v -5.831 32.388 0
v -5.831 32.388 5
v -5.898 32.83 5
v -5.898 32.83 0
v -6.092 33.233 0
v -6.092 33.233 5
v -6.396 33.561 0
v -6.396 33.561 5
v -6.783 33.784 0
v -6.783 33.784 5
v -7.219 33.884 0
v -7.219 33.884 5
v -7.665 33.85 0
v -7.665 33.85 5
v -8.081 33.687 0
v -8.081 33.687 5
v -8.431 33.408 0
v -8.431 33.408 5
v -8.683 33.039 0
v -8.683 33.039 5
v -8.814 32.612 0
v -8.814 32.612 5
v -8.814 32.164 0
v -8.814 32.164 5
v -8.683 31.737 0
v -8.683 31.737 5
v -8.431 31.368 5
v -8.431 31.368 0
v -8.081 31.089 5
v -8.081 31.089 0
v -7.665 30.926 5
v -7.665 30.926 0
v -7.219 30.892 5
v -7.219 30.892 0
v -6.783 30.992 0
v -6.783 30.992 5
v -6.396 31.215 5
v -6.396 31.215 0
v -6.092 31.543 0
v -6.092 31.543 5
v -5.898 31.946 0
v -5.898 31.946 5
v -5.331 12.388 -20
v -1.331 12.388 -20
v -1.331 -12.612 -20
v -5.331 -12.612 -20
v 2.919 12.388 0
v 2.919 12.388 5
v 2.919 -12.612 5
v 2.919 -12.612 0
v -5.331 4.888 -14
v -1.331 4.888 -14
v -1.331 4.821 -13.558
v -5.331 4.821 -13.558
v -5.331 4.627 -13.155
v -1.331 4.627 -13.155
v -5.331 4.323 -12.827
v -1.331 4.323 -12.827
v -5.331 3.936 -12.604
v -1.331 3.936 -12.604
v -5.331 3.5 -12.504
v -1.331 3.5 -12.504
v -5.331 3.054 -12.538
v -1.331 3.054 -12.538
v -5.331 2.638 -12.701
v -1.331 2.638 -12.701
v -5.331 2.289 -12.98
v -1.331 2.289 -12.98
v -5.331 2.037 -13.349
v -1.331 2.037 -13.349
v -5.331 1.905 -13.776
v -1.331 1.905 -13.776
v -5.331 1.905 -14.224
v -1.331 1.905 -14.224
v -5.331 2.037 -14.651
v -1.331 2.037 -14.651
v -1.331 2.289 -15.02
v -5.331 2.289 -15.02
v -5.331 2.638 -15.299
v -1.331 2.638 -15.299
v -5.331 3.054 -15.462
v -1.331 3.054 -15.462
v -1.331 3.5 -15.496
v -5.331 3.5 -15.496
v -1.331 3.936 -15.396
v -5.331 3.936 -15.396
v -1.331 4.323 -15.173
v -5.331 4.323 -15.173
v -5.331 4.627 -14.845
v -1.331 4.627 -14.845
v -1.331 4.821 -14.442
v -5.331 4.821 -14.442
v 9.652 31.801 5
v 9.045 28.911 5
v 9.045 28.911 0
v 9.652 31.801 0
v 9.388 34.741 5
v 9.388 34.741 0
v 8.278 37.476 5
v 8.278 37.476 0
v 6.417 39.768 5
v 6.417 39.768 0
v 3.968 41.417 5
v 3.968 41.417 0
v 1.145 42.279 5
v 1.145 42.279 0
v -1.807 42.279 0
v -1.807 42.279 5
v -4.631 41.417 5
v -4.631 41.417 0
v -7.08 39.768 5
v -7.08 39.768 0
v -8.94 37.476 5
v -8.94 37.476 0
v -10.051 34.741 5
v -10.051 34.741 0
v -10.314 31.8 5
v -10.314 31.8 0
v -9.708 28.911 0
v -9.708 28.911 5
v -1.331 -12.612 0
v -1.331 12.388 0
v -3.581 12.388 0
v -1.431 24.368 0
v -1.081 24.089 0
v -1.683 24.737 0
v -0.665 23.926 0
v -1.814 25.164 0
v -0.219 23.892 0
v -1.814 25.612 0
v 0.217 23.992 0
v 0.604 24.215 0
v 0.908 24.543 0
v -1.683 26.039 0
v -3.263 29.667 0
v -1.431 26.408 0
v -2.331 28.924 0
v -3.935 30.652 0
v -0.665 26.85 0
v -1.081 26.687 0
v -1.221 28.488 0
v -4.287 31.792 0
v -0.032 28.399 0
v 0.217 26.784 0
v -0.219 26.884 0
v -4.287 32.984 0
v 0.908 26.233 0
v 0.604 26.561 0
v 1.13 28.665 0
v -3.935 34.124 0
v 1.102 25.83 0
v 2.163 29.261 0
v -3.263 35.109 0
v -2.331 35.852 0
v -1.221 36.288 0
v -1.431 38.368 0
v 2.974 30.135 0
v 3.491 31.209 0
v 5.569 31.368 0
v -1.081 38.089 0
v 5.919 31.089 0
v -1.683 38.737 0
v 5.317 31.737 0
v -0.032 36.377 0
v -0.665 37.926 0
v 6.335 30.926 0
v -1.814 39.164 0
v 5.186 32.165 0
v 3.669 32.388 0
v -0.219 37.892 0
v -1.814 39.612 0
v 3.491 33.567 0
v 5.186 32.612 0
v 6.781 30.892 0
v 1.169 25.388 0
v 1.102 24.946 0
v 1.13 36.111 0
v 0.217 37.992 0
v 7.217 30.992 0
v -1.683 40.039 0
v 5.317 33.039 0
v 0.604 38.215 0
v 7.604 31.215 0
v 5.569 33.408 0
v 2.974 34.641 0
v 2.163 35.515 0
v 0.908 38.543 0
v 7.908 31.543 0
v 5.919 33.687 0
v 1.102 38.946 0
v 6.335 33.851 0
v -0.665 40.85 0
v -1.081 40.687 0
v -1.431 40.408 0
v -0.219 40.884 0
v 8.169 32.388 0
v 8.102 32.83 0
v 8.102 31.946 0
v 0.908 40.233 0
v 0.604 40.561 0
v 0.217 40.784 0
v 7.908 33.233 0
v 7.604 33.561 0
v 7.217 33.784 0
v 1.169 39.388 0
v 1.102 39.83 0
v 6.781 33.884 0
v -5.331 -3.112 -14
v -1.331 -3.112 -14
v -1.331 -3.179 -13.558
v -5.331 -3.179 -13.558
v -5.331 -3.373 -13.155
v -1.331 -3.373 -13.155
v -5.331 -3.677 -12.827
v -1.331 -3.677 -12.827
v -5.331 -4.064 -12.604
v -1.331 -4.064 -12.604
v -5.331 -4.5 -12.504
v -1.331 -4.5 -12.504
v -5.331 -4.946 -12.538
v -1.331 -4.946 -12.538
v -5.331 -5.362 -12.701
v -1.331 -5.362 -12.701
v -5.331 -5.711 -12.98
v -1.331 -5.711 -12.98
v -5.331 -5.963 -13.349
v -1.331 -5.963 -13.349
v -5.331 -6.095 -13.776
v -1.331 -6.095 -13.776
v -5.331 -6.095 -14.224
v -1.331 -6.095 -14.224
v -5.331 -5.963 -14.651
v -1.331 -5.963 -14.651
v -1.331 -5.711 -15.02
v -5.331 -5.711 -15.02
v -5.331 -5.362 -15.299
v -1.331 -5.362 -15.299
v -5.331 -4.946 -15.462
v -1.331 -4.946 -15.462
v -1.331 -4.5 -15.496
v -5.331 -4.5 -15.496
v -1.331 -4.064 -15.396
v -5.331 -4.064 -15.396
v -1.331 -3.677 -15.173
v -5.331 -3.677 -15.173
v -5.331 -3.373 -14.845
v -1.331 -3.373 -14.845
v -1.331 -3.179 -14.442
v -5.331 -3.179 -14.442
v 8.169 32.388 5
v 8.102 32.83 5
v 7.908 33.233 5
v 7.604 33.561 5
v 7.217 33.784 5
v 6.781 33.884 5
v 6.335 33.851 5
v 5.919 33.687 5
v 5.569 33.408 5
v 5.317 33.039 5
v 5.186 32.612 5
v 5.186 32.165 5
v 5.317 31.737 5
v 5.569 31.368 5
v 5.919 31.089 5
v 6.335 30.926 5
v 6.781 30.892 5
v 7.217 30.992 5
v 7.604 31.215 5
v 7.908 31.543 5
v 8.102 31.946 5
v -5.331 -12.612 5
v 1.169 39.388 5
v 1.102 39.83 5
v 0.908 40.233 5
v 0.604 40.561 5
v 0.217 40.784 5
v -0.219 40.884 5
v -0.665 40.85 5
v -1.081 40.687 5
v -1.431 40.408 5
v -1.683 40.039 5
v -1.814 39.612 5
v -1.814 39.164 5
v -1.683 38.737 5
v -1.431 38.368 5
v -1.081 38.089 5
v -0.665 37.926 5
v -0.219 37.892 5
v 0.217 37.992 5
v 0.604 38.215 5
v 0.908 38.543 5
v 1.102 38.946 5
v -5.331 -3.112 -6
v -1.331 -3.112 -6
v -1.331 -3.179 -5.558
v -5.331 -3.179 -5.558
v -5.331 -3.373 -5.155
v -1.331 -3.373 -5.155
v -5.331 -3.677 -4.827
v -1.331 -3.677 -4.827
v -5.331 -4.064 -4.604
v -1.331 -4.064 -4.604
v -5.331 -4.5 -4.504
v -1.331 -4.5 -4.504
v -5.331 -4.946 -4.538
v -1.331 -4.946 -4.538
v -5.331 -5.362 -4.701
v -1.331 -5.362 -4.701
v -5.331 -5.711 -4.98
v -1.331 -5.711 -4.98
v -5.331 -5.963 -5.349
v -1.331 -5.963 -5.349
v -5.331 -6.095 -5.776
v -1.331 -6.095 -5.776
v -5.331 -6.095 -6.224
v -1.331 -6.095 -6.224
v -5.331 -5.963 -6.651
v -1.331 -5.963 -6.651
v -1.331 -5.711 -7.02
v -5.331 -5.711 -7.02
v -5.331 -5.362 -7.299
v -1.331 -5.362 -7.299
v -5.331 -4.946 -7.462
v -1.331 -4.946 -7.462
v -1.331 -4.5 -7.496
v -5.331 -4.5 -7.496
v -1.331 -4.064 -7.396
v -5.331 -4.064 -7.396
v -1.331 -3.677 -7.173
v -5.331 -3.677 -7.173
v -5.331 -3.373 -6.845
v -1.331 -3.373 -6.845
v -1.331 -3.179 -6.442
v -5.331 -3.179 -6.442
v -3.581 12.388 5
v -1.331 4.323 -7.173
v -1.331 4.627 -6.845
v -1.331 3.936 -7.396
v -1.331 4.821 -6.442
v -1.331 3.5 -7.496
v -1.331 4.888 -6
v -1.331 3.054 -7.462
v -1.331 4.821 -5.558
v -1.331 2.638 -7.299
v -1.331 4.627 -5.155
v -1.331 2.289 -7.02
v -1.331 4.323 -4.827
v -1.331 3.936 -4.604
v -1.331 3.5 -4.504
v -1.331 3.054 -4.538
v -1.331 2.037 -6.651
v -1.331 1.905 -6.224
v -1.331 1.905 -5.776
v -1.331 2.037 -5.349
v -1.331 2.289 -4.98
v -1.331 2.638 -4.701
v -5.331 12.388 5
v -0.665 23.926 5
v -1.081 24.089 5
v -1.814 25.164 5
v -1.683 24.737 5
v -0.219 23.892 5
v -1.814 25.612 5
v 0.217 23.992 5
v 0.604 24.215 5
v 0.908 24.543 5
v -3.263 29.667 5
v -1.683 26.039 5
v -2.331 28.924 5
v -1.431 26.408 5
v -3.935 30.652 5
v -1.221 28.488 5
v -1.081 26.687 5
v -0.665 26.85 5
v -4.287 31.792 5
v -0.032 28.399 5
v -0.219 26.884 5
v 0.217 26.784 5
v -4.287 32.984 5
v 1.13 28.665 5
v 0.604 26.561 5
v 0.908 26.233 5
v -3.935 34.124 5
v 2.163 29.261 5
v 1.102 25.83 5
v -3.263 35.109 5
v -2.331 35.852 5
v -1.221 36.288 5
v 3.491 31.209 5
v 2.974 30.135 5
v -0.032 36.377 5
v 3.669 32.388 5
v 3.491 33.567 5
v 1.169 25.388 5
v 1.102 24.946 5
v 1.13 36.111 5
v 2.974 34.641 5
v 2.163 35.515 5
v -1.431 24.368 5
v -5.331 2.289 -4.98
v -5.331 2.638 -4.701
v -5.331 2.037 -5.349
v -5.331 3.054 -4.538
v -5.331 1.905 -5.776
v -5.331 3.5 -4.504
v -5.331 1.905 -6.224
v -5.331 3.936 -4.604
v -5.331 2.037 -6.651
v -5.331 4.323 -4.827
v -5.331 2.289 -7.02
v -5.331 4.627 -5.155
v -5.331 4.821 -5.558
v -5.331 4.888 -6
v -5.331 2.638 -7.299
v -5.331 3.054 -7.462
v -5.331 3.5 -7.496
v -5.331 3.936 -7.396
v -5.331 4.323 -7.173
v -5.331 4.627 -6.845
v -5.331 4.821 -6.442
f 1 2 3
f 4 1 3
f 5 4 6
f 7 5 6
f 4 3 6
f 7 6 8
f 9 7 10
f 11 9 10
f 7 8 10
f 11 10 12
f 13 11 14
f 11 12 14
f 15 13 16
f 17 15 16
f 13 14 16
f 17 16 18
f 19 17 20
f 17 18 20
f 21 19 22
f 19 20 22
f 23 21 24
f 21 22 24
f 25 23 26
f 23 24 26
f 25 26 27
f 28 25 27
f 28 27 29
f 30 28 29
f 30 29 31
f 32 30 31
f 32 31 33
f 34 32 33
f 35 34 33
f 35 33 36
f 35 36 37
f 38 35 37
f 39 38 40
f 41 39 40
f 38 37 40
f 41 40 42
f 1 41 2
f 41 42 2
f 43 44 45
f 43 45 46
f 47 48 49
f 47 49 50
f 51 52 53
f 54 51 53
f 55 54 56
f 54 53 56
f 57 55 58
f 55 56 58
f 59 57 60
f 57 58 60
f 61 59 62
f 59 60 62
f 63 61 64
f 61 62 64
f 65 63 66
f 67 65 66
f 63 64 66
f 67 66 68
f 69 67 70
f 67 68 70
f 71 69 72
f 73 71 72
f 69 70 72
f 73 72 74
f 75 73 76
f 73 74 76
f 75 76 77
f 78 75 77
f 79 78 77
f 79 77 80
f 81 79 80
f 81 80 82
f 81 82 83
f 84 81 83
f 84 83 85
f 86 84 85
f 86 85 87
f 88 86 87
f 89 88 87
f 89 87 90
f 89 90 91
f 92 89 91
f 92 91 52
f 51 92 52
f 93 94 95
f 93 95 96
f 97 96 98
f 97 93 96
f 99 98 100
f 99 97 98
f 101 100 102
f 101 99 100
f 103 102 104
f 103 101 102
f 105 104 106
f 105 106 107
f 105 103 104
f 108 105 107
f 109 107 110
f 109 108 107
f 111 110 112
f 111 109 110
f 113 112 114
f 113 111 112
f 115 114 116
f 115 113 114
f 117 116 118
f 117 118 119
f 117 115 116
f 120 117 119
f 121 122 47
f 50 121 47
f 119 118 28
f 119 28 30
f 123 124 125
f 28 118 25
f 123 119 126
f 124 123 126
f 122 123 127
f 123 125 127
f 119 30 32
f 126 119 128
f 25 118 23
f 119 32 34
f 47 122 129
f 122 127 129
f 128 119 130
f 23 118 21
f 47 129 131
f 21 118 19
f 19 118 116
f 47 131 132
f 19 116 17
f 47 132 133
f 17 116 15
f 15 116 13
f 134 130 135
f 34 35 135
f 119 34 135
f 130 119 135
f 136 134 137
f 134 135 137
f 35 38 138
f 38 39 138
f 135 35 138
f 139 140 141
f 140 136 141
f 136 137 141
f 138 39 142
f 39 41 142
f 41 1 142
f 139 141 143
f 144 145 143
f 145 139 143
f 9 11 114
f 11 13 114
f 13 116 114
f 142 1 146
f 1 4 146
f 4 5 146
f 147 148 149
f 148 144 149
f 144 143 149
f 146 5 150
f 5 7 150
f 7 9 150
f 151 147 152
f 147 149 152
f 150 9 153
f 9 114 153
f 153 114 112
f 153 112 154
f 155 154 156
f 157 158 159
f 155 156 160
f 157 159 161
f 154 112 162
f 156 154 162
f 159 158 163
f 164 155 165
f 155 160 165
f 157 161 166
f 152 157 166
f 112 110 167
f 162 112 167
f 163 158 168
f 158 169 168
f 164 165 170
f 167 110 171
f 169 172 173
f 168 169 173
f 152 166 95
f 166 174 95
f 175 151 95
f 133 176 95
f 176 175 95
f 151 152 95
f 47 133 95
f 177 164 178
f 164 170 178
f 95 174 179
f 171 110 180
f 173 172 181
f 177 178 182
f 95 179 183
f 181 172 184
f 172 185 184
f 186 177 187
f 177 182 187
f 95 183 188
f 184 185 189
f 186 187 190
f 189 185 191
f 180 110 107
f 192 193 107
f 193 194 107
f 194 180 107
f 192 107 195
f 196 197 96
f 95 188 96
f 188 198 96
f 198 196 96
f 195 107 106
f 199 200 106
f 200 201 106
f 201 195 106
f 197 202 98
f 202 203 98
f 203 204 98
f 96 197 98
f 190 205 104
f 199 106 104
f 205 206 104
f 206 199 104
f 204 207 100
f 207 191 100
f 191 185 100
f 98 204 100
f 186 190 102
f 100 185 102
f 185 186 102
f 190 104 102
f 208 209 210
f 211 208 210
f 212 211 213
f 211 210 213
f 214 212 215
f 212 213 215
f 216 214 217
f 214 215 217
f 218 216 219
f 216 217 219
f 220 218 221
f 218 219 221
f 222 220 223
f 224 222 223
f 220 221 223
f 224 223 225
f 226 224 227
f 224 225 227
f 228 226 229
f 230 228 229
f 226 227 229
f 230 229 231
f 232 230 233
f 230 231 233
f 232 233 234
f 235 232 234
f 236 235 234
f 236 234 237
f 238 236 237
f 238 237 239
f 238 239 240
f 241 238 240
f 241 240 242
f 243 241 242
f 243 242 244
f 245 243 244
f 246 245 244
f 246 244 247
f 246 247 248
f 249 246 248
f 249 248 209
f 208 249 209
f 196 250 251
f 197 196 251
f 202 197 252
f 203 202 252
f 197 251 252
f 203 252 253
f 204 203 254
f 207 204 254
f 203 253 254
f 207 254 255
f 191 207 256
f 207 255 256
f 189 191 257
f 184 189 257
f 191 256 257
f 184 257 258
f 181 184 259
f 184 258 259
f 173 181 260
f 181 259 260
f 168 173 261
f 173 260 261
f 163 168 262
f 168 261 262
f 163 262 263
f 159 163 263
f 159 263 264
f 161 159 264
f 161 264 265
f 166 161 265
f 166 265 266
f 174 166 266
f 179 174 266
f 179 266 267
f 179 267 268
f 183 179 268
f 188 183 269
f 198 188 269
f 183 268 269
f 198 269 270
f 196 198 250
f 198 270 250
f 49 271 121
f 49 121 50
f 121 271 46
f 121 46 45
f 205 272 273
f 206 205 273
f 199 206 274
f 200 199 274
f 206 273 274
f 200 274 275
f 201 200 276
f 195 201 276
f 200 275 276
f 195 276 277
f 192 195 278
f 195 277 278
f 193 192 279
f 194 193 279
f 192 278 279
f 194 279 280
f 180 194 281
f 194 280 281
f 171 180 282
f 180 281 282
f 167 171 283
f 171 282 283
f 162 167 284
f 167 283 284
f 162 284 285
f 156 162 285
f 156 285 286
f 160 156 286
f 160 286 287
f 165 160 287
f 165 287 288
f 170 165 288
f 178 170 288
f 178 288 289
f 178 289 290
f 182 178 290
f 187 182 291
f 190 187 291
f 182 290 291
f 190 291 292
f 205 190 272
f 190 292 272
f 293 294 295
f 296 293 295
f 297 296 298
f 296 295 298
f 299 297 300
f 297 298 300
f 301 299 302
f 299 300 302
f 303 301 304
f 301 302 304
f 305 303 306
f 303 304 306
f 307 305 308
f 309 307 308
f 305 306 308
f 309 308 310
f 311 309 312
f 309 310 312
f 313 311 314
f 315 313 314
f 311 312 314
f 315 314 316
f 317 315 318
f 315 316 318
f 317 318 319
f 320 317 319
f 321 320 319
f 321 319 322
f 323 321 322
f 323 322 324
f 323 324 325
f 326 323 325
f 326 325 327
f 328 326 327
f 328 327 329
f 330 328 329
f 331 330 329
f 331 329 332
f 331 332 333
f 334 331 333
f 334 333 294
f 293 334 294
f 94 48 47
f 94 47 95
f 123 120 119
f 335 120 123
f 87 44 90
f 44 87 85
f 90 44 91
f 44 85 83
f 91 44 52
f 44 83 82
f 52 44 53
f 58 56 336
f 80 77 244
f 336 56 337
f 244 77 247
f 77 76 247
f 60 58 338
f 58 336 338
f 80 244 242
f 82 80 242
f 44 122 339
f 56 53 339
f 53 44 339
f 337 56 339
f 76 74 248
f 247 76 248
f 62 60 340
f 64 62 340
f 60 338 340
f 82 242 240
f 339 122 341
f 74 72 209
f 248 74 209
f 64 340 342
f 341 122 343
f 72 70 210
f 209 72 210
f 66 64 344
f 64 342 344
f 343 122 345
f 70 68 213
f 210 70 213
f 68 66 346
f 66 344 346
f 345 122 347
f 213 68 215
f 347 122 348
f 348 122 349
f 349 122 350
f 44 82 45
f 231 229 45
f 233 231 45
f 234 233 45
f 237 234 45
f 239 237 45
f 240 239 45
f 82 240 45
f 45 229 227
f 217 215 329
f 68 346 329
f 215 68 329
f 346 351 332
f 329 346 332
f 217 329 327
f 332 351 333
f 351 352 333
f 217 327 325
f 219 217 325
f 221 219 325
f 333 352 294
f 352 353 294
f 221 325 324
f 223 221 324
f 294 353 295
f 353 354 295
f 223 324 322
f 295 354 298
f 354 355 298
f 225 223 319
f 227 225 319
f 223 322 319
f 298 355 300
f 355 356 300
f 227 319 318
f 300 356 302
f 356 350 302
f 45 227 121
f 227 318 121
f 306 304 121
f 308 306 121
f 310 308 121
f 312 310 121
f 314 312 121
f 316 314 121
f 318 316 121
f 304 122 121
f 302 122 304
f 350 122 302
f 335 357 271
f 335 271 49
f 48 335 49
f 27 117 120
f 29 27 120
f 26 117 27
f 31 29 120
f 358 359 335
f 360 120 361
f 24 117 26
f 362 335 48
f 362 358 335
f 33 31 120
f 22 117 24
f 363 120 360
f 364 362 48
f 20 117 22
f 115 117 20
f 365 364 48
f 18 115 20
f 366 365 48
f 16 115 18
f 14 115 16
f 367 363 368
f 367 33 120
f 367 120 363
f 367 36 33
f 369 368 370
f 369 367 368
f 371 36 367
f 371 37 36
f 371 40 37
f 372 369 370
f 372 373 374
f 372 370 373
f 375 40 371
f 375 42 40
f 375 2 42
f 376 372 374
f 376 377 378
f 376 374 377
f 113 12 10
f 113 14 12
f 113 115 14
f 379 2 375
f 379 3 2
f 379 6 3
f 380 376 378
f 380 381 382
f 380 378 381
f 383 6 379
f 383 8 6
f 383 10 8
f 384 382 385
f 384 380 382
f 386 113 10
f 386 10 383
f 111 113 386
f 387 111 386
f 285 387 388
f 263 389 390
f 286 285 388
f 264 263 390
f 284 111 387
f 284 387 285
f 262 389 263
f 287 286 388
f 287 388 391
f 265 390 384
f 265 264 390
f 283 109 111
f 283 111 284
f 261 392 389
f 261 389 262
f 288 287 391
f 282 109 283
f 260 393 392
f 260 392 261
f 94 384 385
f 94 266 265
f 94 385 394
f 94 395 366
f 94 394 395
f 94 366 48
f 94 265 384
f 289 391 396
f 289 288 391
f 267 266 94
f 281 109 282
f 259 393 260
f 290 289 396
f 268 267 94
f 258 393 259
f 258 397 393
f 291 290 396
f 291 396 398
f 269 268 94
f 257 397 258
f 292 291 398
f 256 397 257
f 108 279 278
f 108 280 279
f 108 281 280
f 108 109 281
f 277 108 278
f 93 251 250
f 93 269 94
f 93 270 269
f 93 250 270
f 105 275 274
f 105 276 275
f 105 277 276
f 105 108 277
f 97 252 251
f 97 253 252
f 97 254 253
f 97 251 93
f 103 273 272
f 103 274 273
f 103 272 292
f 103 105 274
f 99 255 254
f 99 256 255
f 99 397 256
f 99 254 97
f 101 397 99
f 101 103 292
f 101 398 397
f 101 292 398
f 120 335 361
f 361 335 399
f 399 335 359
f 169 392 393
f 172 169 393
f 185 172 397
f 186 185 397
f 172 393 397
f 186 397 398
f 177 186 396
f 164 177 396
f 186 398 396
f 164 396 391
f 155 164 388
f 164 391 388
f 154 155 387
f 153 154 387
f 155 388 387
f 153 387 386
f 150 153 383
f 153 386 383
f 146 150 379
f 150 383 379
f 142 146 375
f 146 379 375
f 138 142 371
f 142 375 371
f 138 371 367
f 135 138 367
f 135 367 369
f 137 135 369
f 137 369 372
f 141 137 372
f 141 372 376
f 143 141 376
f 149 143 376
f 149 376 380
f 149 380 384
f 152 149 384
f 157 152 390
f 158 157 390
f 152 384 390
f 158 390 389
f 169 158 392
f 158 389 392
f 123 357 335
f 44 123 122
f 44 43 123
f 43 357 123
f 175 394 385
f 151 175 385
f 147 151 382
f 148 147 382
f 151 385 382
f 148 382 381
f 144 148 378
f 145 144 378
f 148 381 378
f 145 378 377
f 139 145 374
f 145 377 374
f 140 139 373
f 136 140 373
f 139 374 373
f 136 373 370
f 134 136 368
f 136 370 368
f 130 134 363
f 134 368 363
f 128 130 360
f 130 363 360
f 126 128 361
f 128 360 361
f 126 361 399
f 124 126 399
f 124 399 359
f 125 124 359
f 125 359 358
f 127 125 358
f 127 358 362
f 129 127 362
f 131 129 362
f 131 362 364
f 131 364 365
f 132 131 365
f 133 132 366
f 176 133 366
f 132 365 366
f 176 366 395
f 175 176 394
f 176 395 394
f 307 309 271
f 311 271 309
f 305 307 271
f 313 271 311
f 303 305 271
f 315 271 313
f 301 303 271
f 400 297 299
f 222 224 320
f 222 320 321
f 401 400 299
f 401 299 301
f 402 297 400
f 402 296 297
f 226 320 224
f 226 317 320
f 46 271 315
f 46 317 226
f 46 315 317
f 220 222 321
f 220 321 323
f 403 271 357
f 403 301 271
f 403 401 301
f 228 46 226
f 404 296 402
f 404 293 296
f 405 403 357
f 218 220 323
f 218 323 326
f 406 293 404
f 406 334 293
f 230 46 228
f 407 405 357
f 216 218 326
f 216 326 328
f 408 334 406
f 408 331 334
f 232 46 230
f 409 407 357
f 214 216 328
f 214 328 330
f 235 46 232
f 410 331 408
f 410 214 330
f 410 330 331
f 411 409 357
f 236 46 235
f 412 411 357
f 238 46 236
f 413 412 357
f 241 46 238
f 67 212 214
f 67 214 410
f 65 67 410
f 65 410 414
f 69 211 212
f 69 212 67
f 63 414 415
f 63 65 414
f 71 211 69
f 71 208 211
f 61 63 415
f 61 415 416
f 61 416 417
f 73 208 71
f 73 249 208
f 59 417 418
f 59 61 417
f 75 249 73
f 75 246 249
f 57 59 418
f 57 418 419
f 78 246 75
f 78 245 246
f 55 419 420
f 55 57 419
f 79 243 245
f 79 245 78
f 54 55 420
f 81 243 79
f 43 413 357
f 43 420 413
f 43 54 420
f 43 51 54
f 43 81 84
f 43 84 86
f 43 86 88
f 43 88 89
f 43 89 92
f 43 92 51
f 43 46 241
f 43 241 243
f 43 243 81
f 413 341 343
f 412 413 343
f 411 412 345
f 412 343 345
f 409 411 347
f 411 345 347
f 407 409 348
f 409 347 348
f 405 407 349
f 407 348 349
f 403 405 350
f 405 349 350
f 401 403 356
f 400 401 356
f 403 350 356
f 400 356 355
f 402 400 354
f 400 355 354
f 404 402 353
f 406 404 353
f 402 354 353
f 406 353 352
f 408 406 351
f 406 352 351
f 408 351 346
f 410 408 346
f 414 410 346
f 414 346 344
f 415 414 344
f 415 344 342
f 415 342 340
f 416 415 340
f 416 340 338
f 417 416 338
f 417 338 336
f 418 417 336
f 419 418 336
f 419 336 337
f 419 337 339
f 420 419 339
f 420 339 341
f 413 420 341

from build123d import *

# Parameters (mm, degrees)
SKETCH_1_R          = 1.25
EXTRUDE_1_DEPTH     = 5
SKETCH_2_W          = 5
SKETCH_2_H          = 25
EXTRUDE_2_DEPTH     = 4
SKETCH_3_W          = 4
SKETCH_3_H          = 25
EXTRUDE_3_DEPTH     = 20
SKETCH_4_R          = 1.5
CUT_EXTRUDE_1_DEPTH = 20
EXTRUDE_START       = -5
SKETCH_7_R          = 1.25
EXTRUDE_4_DEPTH     = 5
SKETCH_8_R          = 1.5
SKETCH_8_R_2        = 4
EXTRUDE_5_DEPTH     = 5
EXTRUDE_START_2     = 4
SKETCH_14_W         = 25
SKETCH_14_H         = 25
SKETCH_14_R         = 1.5
EXTRUDE_9_DEPTH     = 4
SKETCH_15_W         = 4
SKETCH_15_H         = 25
CUT_EXTRUDE_2_DEPTH = 100
SKETCH_19_W         = 1.750049733
SKETCH_19_H         = 25
EXTRUDE_10_DEPTH    = 20
SKETCH_20_R         = 1.5
CUT_EXTRUDE_3_DEPTH = 20
SKETCH_21_W         = 25
SKETCH_21_H         = 25
CUT_EXTRUDE_4_DEPTH = 4
SKETCH_22_W         = 1.750049733
SKETCH_22_H         = 25
EXTRUDE_11_DEPTH    = 5


with BuildPart() as part:
    # 草图1 → 凸台-拉伸1 (new body)
    with BuildSketch(Plane.XY):
        Polygon((-3.581151343, -8.027992706), (-3.581151343, -12.611885422), (2.918848657, -12.611885422), (2.918848657, -6.641886627), (2.918848657, 12.388114578), (-3.581151343, 12.388114578), align=None)
        with Locations((-0.081151343, 8.237522913)):
            Circle(SKETCH_1_R, mode=Mode.SUBTRACT)
        with Locations((-0.081151343, 2.787522913)):
            Circle(SKETCH_1_R, mode=Mode.SUBTRACT)
        with Locations((-0.081151343, -2.662477087)):
            Circle(SKETCH_1_R, mode=Mode.SUBTRACT)
        with Locations((-0.000846901, -8.111885422)):
            Circle(SKETCH_1_R, mode=Mode.SUBTRACT)
    extrude(amount=EXTRUDE_1_DEPTH)

    # 草图2 → 凸台-拉伸2 (add)
    with BuildSketch(Plane.ZY.offset(3.581151343)):
        with Locations((2.5, -0.111885422)):
            Rectangle(SKETCH_2_W, SKETCH_2_H)
    extrude(amount=EXTRUDE_2_DEPTH)

    # 草图3 → 凸台-拉伸3 (add)
    with BuildSketch(Plane(origin=(0, 0, 0), x_dir=(-1, 0, 0), z_dir=(0, 0, -1))):
        with Locations((5.581151343, -0.111885422)):
            Rectangle(SKETCH_3_W, SKETCH_3_H)
    extrude(amount=EXTRUDE_3_DEPTH)

    # 草图4 → 切除-拉伸1 (cut)
    with BuildSketch(Plane(origin=(-3.581151343, 0, 0), x_dir=(0, 0, -1), z_dir=(1, 0, 0))):
        with Locations(Location((6, 3.388114578, 0), (0, 0, 90))):
            Circle(SKETCH_4_R)
        with Locations(Location((14, 3.388114578, 0), (0, 0, 180))):
            Circle(SKETCH_4_R)
        with Locations(Location((14, -4.611885422, 0), (0, 0, 90))):
            Circle(SKETCH_4_R)
        with Locations(Location((6, -4.611885422, 0), (0, 0, 180))):
            Circle(SKETCH_4_R)
    extrude(amount=-CUT_EXTRUDE_1_DEPTH, mode=Mode.SUBTRACT)

    # 草图7 → 凸台-拉伸4 (add)
    with BuildSketch(Plane.XY.offset(5).offset(EXTRUDE_START)):
        with Locations((-0.081151343, 8.237522913)):
            Circle(SKETCH_7_R)
        with Locations((-0.081151343, 2.787522913)):
            Circle(SKETCH_7_R)
        with Locations((-0.081151343, -2.662477087)):
            Circle(SKETCH_7_R)
        with Locations((-0.000846901, -8.111885422)):
            Circle(SKETCH_7_R)
    extrude(amount=EXTRUDE_4_DEPTH)

    # 草图8 → 凸台-拉伸5 (add)
    with BuildSketch(Plane.XY.offset(5)):
        with BuildLine():
            ThreePointArc((9.045368421, 28.911309576), (-0.331303735, 42.388418969), (-9.707833242, 28.911210329))
            Line((-9.707833242, 28.911210329), (-3.581151343, 12.388114578))
            Line((-3.581151343, 12.388114578), (2.918848657, 12.388114578))
            Line((2.918848657, 12.388114578), (9.045368421, 28.911309576))
        make_face()
        with Locations((-0.33125081, 25.388000558)):
            Circle(SKETCH_8_R, mode=Mode.SUBTRACT)
        with Locations((-7.33125081, 32.388000558)):
            Circle(SKETCH_8_R, mode=Mode.SUBTRACT)
        with Locations((-0.33125081, 32.388000558)):
            Circle(SKETCH_8_R_2, mode=Mode.SUBTRACT)
        with Locations((-0.33125081, 39.388000558)):
            Circle(SKETCH_8_R, mode=Mode.SUBTRACT)
        with Locations((6.668848657, 32.388114578)):
            Circle(SKETCH_8_R, mode=Mode.SUBTRACT)
    extrude(amount=-EXTRUDE_5_DEPTH)

    # 草图14 → 凸台-拉伸9 (add)
    with BuildSketch(Plane(origin=(2.918848657, 0, 0), x_dir=(0, 0, -1), z_dir=(1, 0, 0)).offset(EXTRUDE_START_2)):
        with Locations((7.5, -0.111885422)):
            Rectangle(SKETCH_14_W, SKETCH_14_H)
        with Locations(Location((6, 3.388114578, 0), (0, 0, 90))):
            Circle(SKETCH_14_R, mode=Mode.SUBTRACT)
        with Locations(Location((14, 3.388114578, 0), (0, 0, 180))):
            Circle(SKETCH_14_R, mode=Mode.SUBTRACT)
        with Locations(Location((14, -4.611885422, 0), (0, 0, 90))):
            Circle(SKETCH_14_R, mode=Mode.SUBTRACT)
        with Locations(Location((6, -4.611885422, 0), (0, 0, 180))):
            Circle(SKETCH_14_R, mode=Mode.SUBTRACT)
    extrude(amount=-EXTRUDE_9_DEPTH)

    # 草图15 → 切除-拉伸2 (cut)
    with BuildSketch(Plane(origin=(0, 0, -20), x_dir=(-1, 0, 0), z_dir=(0, 0, -1))):
        with Locations((5.581151343, -0.111885422)):
            Rectangle(SKETCH_15_W, SKETCH_15_H)
    extrude(amount=-CUT_EXTRUDE_2_DEPTH, mode=Mode.SUBTRACT)

    # 草图19 → 凸台-拉伸10 (add)
    with BuildSketch(Plane(origin=(0, 0, 0), x_dir=(-1, 0, 0), z_dir=(0, 0, -1))):
        with Locations((4.45617621, -0.111885422)):
            Rectangle(SKETCH_19_W, SKETCH_19_H)
        Polygon((1.331201076, 12.388114578), (1.331201076, 9.888057568), (1.331201076, -12.611885422), (3.581151343, -12.611885422), (3.581151343, 12.388114578), align=None)
    extrude(amount=EXTRUDE_10_DEPTH)

    # 草图20 → 切除-拉伸3 (cut)
    with BuildSketch(Plane(origin=(6.918848657, 0, 0), x_dir=(0, 0, -1), z_dir=(1, 0, 0))):
        with Locations(Location((6, 3.388114578, 0), (0, 0, 90))):
            Circle(SKETCH_20_R)
        with Locations(Location((14, 3.388114578, 0), (0, 0, 90))):
            Circle(SKETCH_20_R)
        with Locations(Location((6, -4.611885422, 0), (0, 0, 90))):
            Circle(SKETCH_20_R)
        with Locations(Location((14, -4.611885422, 0), (0, 0, 90))):
            Circle(SKETCH_20_R)
    extrude(amount=-CUT_EXTRUDE_3_DEPTH, mode=Mode.SUBTRACT)

    # 草图21 → 切除-拉伸4 (cut)
    with BuildSketch(Plane(origin=(6.918848657, 0, 0), x_dir=(0, 0, -1), z_dir=(1, 0, 0))):
        with Locations((7.5, -0.111885422)):
            Rectangle(SKETCH_21_W, SKETCH_21_H)
    extrude(amount=-CUT_EXTRUDE_4_DEPTH, mode=Mode.SUBTRACT)

    # 草图22 → 凸台-拉伸11 (add)
    with BuildSketch(Plane.XY):
        with Locations((-4.45617621, -0.111885422)):
            Rectangle(SKETCH_22_W, SKETCH_22_H)
    extrude(amount=EXTRUDE_11_DEPTH)


solid = part.part
